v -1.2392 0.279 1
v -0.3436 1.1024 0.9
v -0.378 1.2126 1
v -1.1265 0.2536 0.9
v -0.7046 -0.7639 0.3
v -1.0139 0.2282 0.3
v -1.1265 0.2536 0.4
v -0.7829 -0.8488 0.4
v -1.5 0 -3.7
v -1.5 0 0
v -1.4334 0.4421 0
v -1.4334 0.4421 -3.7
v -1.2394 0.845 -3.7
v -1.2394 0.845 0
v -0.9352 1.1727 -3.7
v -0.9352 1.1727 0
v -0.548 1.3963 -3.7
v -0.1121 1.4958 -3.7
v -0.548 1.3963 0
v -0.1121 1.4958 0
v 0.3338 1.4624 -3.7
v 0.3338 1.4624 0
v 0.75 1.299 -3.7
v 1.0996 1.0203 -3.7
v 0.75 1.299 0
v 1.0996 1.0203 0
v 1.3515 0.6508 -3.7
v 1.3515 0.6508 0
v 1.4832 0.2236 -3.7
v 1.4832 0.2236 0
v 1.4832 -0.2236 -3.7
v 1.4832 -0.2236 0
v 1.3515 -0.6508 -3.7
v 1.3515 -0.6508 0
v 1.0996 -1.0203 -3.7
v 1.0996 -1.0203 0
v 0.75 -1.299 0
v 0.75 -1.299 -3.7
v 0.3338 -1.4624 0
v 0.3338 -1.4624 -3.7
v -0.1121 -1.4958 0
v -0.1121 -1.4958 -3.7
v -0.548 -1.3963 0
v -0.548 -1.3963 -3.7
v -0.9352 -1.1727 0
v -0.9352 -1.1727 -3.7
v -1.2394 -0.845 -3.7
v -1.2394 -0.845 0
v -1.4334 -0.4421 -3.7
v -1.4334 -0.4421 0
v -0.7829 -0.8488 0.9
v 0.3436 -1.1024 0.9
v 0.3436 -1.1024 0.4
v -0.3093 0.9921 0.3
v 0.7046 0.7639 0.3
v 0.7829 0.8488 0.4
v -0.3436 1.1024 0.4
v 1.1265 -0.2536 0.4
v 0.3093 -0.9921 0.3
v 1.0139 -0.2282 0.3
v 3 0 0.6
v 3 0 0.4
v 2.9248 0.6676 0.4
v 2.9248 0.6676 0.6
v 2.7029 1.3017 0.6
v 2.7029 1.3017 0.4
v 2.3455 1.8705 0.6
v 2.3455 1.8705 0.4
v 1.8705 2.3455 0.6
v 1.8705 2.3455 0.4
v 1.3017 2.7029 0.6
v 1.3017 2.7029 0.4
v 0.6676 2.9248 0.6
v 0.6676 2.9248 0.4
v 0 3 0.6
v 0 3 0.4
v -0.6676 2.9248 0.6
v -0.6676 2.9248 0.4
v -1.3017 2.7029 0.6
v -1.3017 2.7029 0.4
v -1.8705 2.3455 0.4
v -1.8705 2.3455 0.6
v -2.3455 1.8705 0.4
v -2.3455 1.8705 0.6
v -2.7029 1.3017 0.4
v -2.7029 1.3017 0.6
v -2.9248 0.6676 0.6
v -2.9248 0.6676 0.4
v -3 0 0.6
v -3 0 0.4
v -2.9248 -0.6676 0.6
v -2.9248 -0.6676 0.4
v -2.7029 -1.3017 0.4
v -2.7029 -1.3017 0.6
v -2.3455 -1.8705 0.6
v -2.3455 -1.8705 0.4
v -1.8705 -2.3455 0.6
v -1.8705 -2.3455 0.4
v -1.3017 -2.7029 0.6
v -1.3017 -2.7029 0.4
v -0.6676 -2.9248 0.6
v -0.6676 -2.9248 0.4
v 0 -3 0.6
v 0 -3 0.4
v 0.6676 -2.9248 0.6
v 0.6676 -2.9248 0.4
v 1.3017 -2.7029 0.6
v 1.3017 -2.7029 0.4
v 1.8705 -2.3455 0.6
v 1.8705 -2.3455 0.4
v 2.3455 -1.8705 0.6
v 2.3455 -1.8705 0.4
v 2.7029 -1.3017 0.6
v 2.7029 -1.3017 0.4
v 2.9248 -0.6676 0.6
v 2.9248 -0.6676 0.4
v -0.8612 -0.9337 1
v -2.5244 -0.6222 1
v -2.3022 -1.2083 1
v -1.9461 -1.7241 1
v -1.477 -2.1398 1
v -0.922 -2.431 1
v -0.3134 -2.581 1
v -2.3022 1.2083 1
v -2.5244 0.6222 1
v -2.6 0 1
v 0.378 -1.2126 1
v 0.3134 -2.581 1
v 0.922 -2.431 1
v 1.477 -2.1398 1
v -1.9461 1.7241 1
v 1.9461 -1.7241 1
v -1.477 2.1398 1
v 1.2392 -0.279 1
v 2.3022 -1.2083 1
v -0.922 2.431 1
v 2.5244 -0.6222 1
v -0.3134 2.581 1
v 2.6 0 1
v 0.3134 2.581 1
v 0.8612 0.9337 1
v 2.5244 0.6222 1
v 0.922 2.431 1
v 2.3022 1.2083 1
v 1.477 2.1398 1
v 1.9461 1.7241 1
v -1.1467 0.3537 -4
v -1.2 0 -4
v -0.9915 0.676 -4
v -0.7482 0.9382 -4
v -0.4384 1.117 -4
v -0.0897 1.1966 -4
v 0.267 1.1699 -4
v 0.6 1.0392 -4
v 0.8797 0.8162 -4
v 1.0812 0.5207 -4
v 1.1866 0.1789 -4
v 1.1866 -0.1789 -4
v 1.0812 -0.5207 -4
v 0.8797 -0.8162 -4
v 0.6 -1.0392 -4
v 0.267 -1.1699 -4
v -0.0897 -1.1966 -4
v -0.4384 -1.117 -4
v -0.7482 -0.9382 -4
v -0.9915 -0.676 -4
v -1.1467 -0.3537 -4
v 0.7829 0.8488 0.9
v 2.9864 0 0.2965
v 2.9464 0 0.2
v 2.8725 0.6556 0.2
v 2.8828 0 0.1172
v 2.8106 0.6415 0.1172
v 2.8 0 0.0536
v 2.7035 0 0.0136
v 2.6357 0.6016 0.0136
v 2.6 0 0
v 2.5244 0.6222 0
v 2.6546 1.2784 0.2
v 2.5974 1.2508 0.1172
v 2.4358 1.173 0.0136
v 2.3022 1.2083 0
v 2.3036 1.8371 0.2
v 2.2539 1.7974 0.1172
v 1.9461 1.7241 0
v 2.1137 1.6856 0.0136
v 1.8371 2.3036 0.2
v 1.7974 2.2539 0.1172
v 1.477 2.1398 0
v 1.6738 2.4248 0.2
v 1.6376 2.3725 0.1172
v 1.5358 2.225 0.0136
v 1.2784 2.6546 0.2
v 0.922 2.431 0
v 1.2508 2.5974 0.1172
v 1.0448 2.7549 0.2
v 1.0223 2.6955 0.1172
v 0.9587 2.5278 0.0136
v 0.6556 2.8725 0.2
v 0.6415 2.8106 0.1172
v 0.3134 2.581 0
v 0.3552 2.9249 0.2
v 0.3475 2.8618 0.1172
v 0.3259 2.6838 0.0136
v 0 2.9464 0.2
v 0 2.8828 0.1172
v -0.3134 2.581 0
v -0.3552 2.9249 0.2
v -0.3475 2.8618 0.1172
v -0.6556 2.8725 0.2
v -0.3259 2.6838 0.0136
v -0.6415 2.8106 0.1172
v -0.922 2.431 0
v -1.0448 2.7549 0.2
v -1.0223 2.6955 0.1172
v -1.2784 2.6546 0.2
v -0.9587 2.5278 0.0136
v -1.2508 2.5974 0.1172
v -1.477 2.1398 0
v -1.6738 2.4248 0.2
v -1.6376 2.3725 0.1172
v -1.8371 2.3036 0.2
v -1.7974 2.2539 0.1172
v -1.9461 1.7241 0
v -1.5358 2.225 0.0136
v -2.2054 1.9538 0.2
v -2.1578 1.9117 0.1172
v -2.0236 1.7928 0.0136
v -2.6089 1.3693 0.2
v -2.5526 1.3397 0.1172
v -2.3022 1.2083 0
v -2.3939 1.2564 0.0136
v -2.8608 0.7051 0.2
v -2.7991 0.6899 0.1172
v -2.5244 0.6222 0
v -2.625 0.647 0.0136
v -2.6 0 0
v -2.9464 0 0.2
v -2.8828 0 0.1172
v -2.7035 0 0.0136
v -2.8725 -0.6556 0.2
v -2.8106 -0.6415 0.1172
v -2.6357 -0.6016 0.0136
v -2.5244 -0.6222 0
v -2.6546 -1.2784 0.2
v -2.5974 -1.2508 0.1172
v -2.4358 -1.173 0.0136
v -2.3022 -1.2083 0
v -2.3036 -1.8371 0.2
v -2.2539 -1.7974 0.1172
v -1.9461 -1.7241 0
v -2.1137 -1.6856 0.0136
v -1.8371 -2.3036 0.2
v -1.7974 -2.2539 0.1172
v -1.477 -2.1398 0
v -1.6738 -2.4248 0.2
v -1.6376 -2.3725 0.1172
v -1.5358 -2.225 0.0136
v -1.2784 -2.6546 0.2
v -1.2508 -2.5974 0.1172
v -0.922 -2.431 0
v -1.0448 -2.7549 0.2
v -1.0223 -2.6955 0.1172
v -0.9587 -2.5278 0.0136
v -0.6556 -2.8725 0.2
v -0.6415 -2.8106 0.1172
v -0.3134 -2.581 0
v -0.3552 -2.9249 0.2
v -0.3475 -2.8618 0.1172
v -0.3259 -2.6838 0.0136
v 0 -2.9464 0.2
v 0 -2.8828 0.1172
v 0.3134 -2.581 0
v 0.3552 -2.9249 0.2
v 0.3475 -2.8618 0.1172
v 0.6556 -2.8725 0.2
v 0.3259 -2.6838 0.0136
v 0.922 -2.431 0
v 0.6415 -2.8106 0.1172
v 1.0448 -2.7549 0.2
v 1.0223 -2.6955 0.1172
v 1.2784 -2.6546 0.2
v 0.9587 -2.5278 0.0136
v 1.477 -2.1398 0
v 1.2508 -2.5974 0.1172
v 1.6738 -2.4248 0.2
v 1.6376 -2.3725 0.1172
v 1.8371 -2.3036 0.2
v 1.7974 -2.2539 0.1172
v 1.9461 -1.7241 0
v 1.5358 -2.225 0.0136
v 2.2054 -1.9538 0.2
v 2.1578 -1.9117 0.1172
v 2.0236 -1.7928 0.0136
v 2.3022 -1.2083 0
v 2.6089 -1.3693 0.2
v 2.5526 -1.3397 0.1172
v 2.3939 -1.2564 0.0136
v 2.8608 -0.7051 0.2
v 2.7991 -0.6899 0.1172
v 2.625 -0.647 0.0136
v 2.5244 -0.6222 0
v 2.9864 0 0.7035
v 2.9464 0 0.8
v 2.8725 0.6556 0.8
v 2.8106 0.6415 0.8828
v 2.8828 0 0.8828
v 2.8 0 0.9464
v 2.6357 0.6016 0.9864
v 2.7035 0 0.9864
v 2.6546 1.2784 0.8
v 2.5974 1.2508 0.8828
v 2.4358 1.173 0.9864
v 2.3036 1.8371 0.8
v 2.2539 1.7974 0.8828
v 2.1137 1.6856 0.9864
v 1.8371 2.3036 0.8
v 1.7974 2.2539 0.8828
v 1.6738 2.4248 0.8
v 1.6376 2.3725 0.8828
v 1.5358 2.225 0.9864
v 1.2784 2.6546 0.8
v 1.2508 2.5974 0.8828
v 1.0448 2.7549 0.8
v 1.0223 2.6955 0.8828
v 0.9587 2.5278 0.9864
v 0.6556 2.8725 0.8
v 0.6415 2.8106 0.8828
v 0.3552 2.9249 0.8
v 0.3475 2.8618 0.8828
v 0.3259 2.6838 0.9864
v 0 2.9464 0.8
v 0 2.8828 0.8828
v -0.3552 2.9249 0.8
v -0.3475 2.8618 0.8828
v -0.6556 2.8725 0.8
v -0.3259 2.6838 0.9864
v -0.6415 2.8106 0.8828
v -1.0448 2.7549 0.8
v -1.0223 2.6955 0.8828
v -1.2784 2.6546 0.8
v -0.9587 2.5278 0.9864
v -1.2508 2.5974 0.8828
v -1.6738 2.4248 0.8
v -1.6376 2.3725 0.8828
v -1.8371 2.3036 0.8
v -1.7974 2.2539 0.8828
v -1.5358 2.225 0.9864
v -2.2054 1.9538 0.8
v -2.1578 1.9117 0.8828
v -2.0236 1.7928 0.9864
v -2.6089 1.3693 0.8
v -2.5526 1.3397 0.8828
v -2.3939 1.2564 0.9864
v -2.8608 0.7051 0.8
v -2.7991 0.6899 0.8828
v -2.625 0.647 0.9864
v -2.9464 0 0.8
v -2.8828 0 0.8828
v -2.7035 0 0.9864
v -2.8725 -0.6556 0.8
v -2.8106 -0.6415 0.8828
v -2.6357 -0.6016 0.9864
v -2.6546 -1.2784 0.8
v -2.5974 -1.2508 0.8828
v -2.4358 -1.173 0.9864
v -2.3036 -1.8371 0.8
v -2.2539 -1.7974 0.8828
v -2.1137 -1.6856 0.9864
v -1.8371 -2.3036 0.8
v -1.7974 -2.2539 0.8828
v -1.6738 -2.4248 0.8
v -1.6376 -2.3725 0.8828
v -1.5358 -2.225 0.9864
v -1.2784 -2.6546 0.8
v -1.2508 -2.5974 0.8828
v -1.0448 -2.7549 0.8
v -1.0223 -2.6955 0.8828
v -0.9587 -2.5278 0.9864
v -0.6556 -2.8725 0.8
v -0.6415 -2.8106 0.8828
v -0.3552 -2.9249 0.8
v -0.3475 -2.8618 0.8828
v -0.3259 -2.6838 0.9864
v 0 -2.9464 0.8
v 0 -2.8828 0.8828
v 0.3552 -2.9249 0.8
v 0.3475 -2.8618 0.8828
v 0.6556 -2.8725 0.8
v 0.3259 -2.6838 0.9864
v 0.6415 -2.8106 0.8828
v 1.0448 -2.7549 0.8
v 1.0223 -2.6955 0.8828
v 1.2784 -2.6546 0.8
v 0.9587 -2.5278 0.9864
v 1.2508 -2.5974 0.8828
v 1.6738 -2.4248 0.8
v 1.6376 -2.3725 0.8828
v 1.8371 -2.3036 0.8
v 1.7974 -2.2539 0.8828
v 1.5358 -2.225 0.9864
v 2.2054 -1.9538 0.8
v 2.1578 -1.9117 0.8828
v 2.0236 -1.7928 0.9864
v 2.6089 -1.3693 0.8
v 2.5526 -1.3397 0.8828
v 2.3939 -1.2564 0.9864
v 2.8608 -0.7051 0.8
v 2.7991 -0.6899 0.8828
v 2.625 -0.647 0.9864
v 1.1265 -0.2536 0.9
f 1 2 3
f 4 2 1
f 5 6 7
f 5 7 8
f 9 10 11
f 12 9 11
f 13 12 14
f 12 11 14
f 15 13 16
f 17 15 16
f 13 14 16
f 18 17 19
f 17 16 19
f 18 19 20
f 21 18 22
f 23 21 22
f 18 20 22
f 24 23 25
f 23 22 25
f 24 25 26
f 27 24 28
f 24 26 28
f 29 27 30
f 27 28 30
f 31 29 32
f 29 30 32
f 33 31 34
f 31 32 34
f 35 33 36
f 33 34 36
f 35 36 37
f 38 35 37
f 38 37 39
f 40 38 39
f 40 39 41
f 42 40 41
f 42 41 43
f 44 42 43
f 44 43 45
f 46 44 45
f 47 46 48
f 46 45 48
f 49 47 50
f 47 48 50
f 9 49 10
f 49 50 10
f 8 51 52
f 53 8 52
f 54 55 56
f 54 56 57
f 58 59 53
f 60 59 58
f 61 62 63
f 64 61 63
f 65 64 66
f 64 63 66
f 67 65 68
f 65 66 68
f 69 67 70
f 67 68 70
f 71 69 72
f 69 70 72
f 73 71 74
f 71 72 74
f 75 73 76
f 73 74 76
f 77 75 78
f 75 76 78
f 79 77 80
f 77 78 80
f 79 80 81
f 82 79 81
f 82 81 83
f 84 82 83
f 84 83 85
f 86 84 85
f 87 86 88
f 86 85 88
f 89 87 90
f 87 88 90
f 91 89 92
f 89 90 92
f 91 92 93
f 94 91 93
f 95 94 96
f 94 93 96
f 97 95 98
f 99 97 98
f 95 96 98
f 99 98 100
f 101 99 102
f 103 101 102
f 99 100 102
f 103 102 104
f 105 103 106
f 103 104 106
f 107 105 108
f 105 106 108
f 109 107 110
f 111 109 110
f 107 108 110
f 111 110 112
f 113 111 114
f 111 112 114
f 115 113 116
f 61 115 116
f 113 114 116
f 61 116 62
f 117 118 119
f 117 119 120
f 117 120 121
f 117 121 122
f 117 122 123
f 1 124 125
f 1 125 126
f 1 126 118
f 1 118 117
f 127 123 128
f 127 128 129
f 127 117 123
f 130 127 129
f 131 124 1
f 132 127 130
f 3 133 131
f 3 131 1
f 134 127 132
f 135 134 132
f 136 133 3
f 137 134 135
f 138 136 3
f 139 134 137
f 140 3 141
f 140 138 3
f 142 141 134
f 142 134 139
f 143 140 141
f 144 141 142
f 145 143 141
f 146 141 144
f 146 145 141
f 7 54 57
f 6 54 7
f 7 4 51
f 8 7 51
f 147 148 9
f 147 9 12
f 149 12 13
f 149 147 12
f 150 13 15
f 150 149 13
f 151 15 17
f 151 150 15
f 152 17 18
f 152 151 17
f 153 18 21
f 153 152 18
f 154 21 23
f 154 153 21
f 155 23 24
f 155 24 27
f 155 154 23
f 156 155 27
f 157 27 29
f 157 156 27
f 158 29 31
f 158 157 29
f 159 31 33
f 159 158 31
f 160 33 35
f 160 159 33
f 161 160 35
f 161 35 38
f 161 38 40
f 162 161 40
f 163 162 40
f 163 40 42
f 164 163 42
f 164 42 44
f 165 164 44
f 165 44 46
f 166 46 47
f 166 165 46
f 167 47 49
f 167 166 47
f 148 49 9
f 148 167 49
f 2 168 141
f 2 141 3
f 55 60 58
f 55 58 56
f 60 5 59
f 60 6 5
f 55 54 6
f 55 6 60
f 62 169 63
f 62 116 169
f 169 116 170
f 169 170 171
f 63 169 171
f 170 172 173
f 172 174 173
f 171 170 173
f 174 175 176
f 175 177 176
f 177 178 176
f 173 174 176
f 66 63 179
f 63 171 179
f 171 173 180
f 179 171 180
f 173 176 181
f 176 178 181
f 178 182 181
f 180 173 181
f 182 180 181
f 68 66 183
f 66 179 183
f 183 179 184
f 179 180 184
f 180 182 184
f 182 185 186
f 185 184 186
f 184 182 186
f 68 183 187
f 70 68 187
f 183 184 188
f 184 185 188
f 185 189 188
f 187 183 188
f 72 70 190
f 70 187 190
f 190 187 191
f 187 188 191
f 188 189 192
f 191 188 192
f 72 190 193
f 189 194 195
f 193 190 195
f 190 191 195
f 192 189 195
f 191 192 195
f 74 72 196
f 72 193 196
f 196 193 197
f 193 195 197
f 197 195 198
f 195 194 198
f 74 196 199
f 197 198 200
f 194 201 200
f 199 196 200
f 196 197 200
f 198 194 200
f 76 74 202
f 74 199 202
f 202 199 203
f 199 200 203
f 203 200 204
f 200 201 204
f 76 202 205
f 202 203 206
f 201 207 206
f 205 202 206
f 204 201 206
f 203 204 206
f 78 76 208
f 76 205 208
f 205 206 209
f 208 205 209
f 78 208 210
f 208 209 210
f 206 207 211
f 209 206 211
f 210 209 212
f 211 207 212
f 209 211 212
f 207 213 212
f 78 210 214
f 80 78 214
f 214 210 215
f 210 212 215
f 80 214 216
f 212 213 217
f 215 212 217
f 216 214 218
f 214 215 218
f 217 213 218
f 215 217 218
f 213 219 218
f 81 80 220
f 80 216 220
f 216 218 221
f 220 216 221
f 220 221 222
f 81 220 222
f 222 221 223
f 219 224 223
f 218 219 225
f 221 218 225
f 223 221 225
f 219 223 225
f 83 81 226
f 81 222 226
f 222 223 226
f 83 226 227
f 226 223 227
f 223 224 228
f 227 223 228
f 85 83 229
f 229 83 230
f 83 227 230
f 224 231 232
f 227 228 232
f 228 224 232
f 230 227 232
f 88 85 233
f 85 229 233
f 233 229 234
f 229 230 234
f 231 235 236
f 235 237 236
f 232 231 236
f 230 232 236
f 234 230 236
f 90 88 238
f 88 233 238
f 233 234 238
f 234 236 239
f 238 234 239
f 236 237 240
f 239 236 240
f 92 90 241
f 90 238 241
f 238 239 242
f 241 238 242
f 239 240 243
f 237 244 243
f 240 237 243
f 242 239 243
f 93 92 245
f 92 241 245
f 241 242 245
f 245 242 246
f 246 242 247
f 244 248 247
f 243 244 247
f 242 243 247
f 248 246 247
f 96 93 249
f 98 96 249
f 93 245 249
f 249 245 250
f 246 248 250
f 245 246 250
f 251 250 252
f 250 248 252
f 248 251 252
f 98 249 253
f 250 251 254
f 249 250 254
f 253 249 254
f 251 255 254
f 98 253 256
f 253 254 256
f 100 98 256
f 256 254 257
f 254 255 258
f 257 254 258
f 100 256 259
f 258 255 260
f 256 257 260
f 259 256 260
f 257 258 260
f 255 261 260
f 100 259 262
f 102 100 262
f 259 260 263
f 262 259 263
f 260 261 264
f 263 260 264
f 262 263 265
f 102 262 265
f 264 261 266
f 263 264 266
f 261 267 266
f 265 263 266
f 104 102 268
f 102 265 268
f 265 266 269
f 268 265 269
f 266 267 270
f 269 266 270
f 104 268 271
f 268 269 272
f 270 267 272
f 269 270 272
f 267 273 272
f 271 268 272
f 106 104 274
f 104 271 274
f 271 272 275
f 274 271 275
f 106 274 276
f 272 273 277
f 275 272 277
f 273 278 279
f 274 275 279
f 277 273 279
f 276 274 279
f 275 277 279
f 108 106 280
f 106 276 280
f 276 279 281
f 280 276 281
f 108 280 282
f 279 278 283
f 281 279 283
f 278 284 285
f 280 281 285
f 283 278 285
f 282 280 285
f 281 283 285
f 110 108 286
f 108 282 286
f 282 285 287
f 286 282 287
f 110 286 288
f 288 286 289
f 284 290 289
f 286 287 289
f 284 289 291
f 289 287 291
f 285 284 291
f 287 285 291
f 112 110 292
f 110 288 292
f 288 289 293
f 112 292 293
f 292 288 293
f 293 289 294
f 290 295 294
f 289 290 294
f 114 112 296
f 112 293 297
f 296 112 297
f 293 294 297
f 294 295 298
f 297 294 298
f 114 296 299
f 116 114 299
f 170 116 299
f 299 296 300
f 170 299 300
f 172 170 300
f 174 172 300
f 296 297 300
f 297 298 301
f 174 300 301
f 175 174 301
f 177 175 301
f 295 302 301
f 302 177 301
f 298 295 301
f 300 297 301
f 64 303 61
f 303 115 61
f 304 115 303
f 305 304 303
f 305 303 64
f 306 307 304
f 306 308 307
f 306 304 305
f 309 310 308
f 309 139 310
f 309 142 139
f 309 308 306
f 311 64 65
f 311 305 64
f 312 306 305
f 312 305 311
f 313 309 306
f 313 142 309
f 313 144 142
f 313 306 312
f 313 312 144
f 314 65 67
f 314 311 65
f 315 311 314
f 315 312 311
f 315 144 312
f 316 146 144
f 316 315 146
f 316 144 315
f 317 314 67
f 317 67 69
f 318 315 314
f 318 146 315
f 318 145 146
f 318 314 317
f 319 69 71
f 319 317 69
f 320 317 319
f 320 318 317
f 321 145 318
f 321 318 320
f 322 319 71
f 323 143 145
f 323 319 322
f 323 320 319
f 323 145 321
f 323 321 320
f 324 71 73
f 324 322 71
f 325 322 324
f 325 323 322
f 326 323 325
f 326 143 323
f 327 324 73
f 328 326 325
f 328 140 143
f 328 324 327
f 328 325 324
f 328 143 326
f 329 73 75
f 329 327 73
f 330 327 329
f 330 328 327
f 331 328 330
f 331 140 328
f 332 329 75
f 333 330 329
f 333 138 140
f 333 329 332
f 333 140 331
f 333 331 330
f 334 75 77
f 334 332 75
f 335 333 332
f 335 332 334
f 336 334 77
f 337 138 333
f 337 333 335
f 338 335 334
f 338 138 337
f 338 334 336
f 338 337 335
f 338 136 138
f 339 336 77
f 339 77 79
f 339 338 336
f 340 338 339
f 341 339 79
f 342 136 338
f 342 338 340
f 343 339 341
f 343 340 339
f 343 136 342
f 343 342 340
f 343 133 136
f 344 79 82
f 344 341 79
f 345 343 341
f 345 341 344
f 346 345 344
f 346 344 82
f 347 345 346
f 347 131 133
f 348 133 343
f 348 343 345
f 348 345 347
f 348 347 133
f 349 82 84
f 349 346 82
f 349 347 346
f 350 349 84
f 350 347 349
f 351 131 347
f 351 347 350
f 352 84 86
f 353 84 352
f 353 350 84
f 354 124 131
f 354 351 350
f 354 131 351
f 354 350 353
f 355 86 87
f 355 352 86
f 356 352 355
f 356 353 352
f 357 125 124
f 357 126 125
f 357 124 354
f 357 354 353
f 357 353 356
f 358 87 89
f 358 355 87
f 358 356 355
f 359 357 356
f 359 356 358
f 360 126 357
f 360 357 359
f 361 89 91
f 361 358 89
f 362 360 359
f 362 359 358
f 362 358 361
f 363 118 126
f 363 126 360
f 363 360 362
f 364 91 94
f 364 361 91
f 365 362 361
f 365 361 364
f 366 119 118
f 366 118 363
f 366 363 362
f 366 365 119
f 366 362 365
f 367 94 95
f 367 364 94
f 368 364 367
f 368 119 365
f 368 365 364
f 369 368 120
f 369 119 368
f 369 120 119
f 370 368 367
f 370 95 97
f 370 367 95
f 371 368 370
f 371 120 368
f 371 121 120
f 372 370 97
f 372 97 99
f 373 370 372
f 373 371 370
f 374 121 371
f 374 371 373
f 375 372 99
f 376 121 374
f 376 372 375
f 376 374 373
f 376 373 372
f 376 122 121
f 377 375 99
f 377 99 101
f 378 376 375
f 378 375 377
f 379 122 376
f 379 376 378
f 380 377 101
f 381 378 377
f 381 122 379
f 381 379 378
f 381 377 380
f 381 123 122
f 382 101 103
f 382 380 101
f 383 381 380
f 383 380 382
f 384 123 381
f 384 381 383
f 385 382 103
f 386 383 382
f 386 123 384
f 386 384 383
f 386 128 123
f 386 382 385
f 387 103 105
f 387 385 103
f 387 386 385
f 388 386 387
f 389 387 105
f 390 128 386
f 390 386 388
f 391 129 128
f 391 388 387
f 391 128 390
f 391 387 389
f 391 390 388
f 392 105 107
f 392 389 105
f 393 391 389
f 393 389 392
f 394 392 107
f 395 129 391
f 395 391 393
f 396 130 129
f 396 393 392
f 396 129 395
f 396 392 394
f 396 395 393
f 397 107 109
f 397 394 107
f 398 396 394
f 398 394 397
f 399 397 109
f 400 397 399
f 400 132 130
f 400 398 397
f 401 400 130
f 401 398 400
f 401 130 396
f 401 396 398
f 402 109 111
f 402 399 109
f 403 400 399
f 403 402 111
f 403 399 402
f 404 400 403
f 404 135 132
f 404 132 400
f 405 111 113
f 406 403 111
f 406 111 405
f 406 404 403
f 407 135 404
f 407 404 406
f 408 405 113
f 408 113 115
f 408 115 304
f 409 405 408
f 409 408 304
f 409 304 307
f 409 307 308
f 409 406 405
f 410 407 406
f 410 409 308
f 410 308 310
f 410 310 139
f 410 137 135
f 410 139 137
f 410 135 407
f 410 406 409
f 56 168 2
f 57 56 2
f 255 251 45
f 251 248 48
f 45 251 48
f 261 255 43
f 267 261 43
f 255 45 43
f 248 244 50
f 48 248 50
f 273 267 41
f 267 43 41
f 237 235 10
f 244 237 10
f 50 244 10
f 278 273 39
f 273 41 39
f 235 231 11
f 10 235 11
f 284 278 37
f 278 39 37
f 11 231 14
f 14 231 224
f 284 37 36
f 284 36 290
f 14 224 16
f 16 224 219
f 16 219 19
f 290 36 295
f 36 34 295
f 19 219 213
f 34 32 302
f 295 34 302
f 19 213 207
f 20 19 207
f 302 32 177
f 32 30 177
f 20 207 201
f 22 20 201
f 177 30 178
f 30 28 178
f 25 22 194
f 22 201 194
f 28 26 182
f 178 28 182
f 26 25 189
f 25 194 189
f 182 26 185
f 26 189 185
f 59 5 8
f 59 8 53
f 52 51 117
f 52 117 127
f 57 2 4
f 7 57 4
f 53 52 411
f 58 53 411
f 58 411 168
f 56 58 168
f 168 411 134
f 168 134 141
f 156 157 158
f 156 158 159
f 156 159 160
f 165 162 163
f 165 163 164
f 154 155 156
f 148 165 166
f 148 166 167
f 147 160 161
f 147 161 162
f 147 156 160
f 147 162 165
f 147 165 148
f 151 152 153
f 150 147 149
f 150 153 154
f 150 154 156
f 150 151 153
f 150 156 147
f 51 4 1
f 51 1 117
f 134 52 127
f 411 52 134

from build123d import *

# Parameters (mm, degrees)
SKETCH_1_R          = 3
EXTRUDE_1_DEPTH     = 1
SKETCH_2_R          = 1.5
EXTRUDE_2_DEPTH     = 4
FILLET_1_R          = 0.4
CUT_EXTRUDE_1_DEPTH = 0.7
CHAMFER_1_SIZE      = 0.1
CHAMFER_2_SIZE      = 0.3


with BuildPart() as part:
    # 草图1 → 凸台-拉伸1 (new body)
    with BuildSketch(Plane.XY):
        Circle(SKETCH_1_R)
    extrude(amount=EXTRUDE_1_DEPTH)

    # 草图2 → 凸台-拉伸2 (add)
    with BuildSketch(Plane(origin=(0, 0, 0), x_dir=(-1, 0, 0), z_dir=(0, 0, -1))):
        Circle(SKETCH_2_R)
    extrude(amount=EXTRUDE_2_DEPTH)

    # 圆角1
    fillet_1_edges = [part.edges().sort_by_distance(p)[0] for p in [
        (-3, 0, 0),
        (-3, 0, 1),
    ]]
    fillet(fillet_1_edges, radius=FILLET_1_R)

    # 草图3 → 切除-拉伸1 (cut)
    with BuildSketch(Plane.XY.offset(1)):
        Polygon((0.343622422, -1.10238694), (1.126506305, -0.253607723), (0.782883884, 0.848779216), (-0.343622422, 1.10238694), (-1.126506305, 0.253607723), (-0.782883884, -0.848779216), align=None)
    extrude(amount=-CUT_EXTRUDE_1_DEPTH, mode=Mode.SUBTRACT)

    # 倒角1
    chamfer_1_edges = [part.edges().sort_by_distance(p)[0] for p in [
        (-0.219630731, -0.975583078, 0.3),
        (-0.954695095, -0.297585747, 0.3),
        (-0.735064364, 0.677997331, 0.3),
        (0.219630731, 0.975583078, 0.3),
        (0.954695095, 0.297585747, 0.3),
        (0.735064364, -0.677997331, 0.3),
        (-0.219630731, -0.975583078, 1),
        (0.735064364, -0.677997331, 1),
        (0.954695095, 0.297585747, 1),
        (0.219630731, 0.975583078, 1),
        (-0.735064364, 0.677997331, 1),
        (-0.954695095, -0.297585747, 1),
    ]]
    chamfer(chamfer_1_edges, length=CHAMFER_1_SIZE)

    # 倒角2
    chamfer_2_edges = [part.edges().sort_by_distance(p)[0] for p in [
        (1.5, 0, -4),
    ]]
    chamfer(chamfer_2_edges, length=CHAMFER_2_SIZE)


solid = part.part
